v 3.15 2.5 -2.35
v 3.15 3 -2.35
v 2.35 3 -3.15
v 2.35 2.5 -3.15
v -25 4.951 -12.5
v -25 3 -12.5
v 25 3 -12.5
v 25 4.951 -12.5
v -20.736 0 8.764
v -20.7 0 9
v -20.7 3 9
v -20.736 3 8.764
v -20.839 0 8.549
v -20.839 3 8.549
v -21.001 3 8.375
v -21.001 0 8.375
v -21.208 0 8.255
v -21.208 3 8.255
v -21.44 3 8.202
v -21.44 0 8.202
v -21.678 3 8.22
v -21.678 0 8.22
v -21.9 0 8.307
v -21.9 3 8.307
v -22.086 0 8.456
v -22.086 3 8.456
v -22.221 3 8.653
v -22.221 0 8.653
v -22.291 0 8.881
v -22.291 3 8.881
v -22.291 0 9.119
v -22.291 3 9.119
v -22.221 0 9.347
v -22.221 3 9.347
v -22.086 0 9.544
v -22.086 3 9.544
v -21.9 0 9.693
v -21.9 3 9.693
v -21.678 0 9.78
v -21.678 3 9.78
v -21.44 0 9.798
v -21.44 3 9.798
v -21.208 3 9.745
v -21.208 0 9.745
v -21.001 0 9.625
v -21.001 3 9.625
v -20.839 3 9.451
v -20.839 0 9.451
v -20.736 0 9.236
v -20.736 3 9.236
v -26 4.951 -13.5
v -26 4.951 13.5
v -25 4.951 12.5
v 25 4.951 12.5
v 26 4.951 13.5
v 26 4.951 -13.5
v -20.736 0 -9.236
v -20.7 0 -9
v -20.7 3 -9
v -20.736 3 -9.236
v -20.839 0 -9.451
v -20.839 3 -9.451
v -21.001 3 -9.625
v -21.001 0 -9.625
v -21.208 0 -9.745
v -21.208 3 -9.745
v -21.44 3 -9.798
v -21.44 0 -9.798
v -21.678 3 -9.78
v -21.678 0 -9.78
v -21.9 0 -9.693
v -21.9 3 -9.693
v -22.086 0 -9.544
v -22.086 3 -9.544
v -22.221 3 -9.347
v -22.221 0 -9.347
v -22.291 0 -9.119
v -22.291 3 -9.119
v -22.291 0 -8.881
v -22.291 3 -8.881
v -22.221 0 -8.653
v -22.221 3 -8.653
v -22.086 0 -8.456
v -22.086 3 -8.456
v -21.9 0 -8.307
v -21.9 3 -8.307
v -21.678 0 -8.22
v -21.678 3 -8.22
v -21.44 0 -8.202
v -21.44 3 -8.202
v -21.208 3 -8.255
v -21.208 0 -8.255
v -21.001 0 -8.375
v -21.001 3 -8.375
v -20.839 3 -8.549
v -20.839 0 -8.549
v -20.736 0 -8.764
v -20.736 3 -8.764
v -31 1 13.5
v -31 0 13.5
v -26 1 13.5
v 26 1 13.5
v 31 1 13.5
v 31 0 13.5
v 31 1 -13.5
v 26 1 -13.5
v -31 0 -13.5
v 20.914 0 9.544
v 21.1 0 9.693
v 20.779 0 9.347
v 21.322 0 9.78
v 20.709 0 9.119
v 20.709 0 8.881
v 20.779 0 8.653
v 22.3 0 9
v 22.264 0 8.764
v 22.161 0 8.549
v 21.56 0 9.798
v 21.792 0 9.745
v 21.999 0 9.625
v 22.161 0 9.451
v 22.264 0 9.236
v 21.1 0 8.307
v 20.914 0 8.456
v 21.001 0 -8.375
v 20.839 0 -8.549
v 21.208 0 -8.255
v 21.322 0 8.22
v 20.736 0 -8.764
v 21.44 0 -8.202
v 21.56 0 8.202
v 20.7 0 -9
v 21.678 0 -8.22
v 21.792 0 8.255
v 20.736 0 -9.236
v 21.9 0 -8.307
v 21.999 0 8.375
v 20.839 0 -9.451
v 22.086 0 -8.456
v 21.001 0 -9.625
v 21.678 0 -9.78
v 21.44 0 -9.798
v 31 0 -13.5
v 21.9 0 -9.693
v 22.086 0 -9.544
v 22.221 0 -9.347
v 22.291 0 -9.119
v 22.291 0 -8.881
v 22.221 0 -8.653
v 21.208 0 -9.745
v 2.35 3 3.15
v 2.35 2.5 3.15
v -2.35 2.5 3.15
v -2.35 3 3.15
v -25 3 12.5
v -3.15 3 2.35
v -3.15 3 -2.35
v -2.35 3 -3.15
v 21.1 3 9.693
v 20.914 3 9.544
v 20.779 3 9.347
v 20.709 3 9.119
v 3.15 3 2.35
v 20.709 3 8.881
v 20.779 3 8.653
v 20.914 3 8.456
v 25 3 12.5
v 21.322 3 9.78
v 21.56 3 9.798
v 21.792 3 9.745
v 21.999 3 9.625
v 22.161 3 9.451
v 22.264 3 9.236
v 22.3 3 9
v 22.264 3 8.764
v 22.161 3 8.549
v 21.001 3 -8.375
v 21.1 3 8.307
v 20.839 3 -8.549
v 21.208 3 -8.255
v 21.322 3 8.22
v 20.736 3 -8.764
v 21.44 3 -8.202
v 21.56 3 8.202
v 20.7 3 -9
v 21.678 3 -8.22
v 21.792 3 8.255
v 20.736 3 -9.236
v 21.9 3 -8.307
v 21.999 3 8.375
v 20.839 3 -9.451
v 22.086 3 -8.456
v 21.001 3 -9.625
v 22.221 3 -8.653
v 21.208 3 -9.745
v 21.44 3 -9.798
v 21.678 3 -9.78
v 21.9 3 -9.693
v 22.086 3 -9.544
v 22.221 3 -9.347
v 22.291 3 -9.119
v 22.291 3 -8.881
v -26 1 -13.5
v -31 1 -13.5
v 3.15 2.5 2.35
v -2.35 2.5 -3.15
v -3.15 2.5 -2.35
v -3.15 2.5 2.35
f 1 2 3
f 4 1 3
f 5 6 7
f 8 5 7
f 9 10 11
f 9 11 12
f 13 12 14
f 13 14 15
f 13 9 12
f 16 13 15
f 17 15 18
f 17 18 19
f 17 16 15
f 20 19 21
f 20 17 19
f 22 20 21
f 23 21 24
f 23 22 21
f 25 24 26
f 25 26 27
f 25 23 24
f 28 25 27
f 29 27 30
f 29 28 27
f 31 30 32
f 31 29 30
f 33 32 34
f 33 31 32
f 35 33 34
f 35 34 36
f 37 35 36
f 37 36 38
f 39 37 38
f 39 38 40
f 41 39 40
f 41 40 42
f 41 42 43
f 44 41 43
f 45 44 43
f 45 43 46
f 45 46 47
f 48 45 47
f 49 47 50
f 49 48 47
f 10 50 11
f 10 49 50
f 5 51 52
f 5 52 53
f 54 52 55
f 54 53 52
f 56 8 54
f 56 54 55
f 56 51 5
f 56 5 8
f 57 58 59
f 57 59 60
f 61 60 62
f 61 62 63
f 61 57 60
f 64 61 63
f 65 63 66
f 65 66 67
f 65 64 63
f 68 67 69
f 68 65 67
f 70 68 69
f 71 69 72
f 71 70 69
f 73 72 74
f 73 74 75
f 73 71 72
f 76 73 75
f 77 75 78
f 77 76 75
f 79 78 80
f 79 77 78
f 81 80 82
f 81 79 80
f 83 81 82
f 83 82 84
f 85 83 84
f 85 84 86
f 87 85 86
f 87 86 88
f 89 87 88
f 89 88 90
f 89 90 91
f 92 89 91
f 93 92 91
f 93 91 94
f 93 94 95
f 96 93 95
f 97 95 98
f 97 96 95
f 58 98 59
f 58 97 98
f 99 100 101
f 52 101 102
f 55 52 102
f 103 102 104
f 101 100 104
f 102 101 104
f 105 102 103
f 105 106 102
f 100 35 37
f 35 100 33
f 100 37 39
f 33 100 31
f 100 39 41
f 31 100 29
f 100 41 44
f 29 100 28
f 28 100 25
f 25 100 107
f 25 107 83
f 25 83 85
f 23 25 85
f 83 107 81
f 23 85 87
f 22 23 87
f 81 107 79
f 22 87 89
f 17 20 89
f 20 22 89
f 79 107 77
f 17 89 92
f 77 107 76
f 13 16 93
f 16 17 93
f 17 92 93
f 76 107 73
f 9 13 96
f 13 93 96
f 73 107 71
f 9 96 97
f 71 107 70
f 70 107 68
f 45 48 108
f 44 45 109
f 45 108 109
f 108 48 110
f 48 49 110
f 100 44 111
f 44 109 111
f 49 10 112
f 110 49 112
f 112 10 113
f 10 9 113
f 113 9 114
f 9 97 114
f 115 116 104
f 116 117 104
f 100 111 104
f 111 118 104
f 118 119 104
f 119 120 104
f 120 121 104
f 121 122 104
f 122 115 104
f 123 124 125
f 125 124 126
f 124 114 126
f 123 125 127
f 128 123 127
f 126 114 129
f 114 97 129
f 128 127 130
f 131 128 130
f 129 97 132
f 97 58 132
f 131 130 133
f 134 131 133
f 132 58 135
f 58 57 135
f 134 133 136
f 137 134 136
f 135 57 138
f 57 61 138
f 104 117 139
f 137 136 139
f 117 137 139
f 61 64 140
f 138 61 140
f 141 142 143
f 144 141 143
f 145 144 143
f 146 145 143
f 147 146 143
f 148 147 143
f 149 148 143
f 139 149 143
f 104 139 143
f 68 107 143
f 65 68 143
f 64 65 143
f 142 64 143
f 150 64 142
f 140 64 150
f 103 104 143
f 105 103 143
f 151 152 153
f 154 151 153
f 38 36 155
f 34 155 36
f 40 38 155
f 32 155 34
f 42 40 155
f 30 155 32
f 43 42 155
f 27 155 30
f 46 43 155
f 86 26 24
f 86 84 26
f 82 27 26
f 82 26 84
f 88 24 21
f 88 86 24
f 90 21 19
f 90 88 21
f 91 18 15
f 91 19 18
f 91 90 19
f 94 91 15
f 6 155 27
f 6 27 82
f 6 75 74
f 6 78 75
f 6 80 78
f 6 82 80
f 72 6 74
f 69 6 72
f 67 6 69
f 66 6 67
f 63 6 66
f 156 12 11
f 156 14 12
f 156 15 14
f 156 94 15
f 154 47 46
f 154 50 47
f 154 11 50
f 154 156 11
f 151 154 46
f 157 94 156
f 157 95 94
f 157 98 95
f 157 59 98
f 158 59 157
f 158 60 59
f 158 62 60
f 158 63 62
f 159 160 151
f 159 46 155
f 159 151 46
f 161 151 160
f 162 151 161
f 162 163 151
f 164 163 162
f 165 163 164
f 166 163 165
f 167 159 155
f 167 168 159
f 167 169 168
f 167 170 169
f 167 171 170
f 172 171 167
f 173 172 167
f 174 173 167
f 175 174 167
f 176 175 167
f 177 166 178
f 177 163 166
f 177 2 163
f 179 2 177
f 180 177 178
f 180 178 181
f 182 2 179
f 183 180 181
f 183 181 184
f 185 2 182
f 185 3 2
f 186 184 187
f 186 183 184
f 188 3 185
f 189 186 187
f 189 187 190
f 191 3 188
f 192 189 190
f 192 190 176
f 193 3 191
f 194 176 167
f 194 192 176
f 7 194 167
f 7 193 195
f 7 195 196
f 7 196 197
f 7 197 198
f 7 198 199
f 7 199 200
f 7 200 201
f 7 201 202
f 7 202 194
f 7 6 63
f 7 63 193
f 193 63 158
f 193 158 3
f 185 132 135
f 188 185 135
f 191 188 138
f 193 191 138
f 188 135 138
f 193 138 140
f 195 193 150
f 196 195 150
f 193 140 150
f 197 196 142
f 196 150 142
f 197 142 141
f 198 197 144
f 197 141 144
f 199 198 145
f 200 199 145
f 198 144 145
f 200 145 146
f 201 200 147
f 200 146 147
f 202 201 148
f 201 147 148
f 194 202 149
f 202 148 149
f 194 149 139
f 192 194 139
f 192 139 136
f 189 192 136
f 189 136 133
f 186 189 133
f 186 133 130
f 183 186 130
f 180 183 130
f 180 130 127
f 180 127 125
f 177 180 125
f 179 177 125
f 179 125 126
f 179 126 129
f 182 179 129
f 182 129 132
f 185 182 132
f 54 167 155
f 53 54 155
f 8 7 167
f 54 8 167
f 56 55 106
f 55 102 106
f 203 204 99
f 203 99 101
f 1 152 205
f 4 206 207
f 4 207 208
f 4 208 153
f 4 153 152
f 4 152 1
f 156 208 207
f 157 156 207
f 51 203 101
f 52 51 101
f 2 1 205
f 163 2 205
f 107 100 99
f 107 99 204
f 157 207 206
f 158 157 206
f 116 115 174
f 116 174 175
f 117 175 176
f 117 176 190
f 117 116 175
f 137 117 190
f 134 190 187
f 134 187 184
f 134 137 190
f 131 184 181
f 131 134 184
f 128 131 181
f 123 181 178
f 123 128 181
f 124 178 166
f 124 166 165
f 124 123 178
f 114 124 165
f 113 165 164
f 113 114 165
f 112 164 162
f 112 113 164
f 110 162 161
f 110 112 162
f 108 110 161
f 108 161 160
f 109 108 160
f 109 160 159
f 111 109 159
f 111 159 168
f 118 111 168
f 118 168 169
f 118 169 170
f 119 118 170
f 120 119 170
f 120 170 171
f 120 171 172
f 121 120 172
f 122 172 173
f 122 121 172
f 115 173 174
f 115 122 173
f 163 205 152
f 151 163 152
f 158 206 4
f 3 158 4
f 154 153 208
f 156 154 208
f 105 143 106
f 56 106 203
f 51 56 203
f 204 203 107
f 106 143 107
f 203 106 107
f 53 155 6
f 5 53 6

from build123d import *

# Parameters (mm, degrees)
SKETCH2_W           = 5
SKETCH2_H           = 13.5
BOSS_EXTRUDE3_DEPTH = 1
SKETCH2_7_W         = 26
SKETCH2_7_H         = 13.5
BOSS_EXTRUDE6_DEPTH = 4.951
CUT_EXTRUDE2_START  = 4.951
CUT_EXTRUDE2_DEPTH  = 1.951
CUT_EXTRUDE3_START  = 3
CUT_EXTRUDE3_DEPTH  = 0.5
M2_TAPPED_HOLE1_D   = 1.6
BOX_OUTLINE_R       = 0.8
BOX_DEPTH           = 3
BOX_2_OUTLINE_W     = 5
BOX_2_OUTLINE_H     = 13.5
BOX_2_OUTLINE_H_2   = 27
BOX_2_DEPTH         = 1
BOX_START           = 3
BOX_3_DEPTH         = 1.951
BOX_START_2         = 1
BOX_4_DEPTH         = 1.5


# Read off the part's stored shape, not the designer's step: box
with BuildPart() as part:
    # Sketch2 → Boss-Extrude3 (new body)
    with BuildSketch(Plane(origin=(0, 0, 0), x_dir=(1, 0, 0), z_dir=(0, 1, 0))):
        with Locations((28.5, 6.75)):
            Rectangle(SKETCH2_W, SKETCH2_H)
    extrude(amount=BOSS_EXTRUDE3_DEPTH)

    # Sketch2<7> → Boss-Extrude6 (add)
    with BuildSketch(Plane(origin=(0, 0, 0), x_dir=(1, 0, 0), z_dir=(0, 1, 0))):
        with Locations((13, 6.75)):
            Rectangle(SKETCH2_7_W, SKETCH2_7_H)
    extrude(amount=BOSS_EXTRUDE6_DEPTH)

    # Sketch2<9> → Cut-Extrude2 (cut)
    with BuildSketch(Plane(origin=(0, 0, 0), x_dir=(1, 0, 0), z_dir=(0, 1, 0)).offset(CUT_EXTRUDE2_START)):
        Polygon((3.15, 0), (25, 0), (25, 12.5), (0, 12.5), (0, 3.15), (2.35, 3.15), (3.15, 2.35), align=None)
        Polygon((0, 0), (3.15, 0), (3.15, 2.35), (2.35, 3.15), (0, 3.15), align=None)
    extrude(amount=-CUT_EXTRUDE2_DEPTH, mode=Mode.SUBTRACT)

    # Sketch2<12> → Cut-Extrude3 (cut)
    with BuildSketch(Plane(origin=(0, 0, 0), x_dir=(1, 0, 0), z_dir=(0, 1, 0)).offset(CUT_EXTRUDE3_START)):
        Polygon((0, 0), (3.15, 0), (3.15, 2.35), (2.35, 3.15), (0, 3.15), align=None)
    extrude(amount=-CUT_EXTRUDE3_DEPTH, mode=Mode.SUBTRACT)

    # M2 Tapped Hole1 (through all)
    with Locations(Plane(origin=(0, 3, 0), x_dir=(1, 0, 0), z_dir=(0, 1, 0))):
        with Locations((21.5, 9)):
            Hole(M2_TAPPED_HOLE1_D / 2)

    # box outline → box (add)
    with BuildSketch(Plane(origin=(0, 0, 0), x_dir=(1, 0, 0), z_dir=(0, 1, 0))):
        Polygon((-26, -13.5), (26, -13.5), (26, 0), (3.15, 0), (3.15, -2.35), (2.35, -3.15), (-2.35, -3.15), (-3.15, -2.35), (-3.15, 2.35), (-2.35, 3.15), (0, 3.15), (0, 13.5), (-26, 13.5), align=None)
        with Locations((-21.5, -9)):
            Circle(BOX_OUTLINE_R, mode=Mode.SUBTRACT)
        with Locations((21.5, -9)):
            Circle(BOX_OUTLINE_R, mode=Mode.SUBTRACT)
        with Locations((-21.5, 9)):
            Circle(BOX_OUTLINE_R, mode=Mode.SUBTRACT)
    extrude(amount=BOX_DEPTH)

    # box 2 outline → box 2 (add)
    with BuildSketch(Plane(origin=(0, 0, 0), x_dir=(1, 0, 0), z_dir=(0, 1, 0))):
        with Locations((28.5, -6.75)):
            Rectangle(BOX_2_OUTLINE_W, BOX_2_OUTLINE_H)
        with Locations((-28.5, 0)):
            Rectangle(BOX_2_OUTLINE_W, BOX_2_OUTLINE_H_2)
        Polygon((3.15, -2.35), (3.15, 0), (0, 0), (0, 3.15), (-2.35, 3.15), (-3.15, 2.35), (-3.15, -2.35), (-2.35, -3.15), (2.35, -3.15), align=None)
    extrude(amount=BOX_2_DEPTH)

    # box 3 outline → box 3 (add)
    with BuildSketch(Plane(origin=(0, 0, 0), x_dir=(1, 0, 0), z_dir=(0, 1, 0)).offset(BOX_START)):
        Polygon((-26, -13.5), (26, -13.5), (26, 0), (25, 0), (25, -12.5), (-25, -12.5), (-25, 12.5), (0, 12.5), (0, 13.5), (-26, 13.5), align=None)
    extrude(amount=BOX_3_DEPTH)

    # box 4 outline → box 4 (add)
    with BuildSketch(Plane(origin=(0, 0, 0), x_dir=(1, 0, 0), z_dir=(0, 1, 0)).offset(BOX_START_2)):
        Polygon((3.15, -2.35), (3.15, 0), (0, 0), (0, 3.15), (-2.35, 3.15), (-3.15, 2.35), (-3.15, -2.35), (-2.35, -3.15), (2.35, -3.15), align=None)
    extrude(amount=BOX_4_DEPTH)


solid = part.part
